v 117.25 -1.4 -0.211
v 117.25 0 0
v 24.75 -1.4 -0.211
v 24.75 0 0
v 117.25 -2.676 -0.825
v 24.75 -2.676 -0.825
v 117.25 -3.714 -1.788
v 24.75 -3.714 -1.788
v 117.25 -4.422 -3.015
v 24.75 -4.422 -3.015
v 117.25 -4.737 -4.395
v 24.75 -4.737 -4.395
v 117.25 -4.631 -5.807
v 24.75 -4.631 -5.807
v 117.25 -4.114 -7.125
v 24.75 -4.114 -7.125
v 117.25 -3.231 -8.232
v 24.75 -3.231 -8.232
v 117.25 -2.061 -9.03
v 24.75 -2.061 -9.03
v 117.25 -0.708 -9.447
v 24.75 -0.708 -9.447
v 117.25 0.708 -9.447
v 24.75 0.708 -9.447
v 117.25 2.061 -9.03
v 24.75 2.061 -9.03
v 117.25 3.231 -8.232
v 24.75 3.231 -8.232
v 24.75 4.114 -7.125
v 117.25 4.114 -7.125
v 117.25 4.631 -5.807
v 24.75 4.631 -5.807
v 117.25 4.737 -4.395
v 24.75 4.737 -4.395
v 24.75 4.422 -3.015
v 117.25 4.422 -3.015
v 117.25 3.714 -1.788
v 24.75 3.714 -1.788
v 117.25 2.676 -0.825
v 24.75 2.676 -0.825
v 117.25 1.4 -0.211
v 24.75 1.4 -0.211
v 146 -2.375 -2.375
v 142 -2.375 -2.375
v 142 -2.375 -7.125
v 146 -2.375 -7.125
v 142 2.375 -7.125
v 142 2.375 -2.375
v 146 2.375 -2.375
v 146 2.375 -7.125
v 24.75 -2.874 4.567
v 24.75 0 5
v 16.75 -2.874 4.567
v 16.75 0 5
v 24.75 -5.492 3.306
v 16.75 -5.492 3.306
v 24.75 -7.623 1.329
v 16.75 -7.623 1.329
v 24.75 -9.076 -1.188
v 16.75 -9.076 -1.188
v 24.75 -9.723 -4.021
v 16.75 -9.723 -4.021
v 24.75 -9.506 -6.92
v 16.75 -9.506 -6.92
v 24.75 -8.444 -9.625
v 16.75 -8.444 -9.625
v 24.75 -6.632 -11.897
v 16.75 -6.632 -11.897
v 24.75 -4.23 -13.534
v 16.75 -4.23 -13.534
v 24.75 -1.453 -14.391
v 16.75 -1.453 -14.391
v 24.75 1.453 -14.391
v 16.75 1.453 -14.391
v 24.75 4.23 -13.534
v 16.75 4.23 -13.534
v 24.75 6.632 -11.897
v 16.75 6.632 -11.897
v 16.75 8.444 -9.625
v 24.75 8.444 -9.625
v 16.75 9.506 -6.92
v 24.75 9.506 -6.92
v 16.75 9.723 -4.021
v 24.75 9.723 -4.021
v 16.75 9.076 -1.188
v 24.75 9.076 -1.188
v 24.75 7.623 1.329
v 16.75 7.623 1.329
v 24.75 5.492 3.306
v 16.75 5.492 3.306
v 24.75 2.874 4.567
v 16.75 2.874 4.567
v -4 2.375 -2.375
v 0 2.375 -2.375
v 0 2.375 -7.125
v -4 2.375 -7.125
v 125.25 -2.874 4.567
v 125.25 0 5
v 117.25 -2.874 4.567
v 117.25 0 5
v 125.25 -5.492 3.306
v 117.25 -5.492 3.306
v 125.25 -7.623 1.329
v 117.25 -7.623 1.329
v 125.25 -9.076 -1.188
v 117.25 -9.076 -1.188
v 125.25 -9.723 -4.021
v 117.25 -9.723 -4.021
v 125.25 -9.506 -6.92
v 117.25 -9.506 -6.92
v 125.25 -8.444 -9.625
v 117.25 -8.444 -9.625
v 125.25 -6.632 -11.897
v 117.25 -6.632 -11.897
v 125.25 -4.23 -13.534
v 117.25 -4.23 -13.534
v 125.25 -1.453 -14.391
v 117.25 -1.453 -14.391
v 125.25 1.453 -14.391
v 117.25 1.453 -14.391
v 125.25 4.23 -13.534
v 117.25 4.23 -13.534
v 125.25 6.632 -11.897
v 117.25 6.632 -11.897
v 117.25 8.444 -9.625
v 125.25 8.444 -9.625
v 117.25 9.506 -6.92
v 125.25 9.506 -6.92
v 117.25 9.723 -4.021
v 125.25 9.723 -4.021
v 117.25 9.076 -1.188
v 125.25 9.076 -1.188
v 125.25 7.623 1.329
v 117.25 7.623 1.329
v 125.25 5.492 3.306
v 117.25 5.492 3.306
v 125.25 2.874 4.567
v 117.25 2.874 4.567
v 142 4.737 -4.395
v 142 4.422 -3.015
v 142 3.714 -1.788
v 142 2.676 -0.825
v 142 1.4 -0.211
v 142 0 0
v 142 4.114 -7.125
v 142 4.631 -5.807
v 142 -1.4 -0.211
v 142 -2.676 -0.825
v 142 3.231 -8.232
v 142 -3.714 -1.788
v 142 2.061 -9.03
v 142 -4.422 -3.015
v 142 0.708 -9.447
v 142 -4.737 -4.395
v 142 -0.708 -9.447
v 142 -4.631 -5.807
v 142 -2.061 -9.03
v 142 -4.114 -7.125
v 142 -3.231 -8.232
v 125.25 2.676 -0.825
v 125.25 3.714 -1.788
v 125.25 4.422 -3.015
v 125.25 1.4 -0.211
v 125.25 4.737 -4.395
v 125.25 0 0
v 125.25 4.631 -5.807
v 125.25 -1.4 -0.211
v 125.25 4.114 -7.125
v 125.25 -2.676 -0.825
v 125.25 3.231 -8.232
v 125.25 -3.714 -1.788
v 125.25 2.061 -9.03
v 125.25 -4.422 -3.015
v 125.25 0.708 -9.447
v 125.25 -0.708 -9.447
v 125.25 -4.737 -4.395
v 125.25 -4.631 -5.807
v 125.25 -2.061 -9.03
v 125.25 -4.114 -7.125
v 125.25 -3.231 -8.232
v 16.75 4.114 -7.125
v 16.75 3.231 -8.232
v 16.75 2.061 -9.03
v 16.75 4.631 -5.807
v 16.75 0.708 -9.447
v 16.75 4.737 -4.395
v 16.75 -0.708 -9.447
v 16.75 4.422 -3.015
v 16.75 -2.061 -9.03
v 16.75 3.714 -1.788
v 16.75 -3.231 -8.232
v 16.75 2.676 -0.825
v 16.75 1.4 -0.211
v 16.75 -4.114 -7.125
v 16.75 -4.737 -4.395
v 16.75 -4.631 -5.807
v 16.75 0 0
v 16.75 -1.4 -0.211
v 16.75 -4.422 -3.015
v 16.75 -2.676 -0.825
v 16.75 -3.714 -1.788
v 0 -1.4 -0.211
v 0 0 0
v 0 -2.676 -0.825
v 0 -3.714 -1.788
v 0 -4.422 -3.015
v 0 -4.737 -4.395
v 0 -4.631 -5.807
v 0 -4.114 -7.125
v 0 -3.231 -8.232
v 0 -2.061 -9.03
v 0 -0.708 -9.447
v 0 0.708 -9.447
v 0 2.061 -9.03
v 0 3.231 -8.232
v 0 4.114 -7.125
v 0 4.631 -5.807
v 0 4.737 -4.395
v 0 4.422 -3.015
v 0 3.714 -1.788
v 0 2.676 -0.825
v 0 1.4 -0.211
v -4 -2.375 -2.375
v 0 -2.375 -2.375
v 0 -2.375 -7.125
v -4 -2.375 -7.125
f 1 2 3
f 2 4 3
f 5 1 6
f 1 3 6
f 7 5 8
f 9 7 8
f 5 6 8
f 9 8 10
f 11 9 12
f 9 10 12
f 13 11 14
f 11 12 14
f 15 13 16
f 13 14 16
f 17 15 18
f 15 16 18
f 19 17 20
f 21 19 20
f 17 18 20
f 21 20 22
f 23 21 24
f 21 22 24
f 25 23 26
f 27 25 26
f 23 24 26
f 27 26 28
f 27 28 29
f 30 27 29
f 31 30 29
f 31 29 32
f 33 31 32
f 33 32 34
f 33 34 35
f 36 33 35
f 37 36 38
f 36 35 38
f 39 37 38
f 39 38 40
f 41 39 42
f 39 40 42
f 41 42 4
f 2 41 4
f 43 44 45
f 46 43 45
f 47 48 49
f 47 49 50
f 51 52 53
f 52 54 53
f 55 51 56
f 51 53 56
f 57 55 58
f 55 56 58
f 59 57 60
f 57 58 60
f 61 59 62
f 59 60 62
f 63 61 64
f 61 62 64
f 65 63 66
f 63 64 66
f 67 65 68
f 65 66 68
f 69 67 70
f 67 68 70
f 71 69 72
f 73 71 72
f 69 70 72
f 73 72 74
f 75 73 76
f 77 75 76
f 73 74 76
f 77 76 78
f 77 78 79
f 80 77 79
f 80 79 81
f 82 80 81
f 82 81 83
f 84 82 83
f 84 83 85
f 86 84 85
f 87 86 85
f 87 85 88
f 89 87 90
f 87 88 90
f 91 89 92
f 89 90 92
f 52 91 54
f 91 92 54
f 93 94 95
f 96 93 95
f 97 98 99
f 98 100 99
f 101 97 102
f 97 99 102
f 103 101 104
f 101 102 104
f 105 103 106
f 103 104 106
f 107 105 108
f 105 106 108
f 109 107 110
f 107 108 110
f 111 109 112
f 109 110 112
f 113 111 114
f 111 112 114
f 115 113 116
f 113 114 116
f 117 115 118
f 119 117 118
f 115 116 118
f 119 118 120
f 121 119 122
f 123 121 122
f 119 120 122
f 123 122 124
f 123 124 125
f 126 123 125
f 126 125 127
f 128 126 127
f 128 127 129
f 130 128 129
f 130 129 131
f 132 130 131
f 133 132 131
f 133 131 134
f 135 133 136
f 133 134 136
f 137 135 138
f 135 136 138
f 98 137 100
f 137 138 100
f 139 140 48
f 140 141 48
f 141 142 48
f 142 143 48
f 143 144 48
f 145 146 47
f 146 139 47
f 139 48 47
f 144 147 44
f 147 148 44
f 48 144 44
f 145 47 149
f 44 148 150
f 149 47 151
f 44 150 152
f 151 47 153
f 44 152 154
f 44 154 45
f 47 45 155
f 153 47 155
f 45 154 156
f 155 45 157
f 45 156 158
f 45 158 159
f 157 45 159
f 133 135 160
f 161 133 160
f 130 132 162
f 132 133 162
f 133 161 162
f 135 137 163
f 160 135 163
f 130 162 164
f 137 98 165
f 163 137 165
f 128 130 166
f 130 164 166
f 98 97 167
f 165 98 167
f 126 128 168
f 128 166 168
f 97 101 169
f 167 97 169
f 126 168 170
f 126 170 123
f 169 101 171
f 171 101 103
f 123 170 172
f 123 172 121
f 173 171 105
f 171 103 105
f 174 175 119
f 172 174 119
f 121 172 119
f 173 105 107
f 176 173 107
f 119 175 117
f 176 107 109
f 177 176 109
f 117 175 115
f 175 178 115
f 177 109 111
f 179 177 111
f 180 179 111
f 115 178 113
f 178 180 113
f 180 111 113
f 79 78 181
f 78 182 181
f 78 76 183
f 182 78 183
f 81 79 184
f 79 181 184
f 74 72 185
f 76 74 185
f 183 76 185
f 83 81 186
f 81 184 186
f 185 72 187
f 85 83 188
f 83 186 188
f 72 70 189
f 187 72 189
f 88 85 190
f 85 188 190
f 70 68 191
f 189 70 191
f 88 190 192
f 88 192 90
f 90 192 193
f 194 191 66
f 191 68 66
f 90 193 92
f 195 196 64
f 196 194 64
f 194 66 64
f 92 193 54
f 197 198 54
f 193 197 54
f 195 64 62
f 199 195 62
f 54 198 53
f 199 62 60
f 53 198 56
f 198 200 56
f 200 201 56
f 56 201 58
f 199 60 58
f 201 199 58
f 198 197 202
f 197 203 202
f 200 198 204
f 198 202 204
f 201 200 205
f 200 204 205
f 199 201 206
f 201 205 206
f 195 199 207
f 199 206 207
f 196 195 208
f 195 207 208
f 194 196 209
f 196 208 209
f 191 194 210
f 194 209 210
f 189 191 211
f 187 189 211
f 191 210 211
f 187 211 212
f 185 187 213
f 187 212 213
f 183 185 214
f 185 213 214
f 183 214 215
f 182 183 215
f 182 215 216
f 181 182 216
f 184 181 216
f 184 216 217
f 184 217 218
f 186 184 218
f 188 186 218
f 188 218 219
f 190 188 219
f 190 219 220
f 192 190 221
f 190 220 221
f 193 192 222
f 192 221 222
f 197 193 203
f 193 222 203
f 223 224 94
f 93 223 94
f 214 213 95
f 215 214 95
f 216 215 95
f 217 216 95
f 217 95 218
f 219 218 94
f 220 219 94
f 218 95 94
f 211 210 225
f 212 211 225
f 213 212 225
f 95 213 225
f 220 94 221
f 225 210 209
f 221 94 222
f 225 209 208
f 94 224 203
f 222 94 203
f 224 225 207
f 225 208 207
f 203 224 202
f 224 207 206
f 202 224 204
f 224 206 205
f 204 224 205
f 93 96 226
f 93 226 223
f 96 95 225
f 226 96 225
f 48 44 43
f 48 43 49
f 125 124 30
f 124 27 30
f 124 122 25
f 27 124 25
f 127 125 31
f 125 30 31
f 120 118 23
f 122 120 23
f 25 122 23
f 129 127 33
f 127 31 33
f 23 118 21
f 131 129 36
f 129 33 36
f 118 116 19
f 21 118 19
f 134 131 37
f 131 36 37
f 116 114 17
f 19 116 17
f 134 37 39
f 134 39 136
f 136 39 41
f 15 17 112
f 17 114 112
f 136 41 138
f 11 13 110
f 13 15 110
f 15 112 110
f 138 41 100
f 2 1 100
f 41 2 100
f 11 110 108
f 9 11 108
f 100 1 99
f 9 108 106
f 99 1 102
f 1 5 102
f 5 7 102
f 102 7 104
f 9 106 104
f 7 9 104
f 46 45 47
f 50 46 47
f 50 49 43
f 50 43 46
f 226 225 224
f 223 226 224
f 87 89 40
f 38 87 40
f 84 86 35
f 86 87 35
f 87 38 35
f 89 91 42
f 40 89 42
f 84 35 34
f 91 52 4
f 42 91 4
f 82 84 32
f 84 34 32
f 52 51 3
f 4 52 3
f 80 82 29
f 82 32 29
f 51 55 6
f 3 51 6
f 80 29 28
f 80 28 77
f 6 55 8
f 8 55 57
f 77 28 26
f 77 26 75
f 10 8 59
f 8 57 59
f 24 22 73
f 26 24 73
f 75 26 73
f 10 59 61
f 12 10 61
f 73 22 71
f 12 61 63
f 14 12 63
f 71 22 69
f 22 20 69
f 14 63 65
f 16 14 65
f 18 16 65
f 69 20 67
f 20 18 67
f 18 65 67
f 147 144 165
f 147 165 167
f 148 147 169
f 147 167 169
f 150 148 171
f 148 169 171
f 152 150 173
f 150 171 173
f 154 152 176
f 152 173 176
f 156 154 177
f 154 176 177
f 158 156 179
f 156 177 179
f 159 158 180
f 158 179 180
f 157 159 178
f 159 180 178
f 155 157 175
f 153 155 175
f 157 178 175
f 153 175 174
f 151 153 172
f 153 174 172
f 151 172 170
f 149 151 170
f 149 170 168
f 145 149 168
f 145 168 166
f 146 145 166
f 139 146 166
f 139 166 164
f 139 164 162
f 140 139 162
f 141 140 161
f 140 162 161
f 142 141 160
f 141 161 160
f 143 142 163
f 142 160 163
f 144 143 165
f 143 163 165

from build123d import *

# Parameters (mm, degrees)
ESQUISSE5_W        = 4.75
ESQUISSE5_H        = 4.75
BOSS_EXTRU_3_DEPTH = 4
BOSS_EXTRU_4_DEPTH = 4


with BuildPart() as part:
    # Esquisse1 → Révolution1 (revolve)
    with BuildSketch(Plane(origin=(0, 0, 0), x_dir=(1, 0, 0), z_dir=(0, 1, 0))):
        Polygon((0, 0), (0, 4.75), (142, 4.75), (142, 0), (125.25, 0), (125.25, -5), (117.25, -5), (117.25, 0), (24.75, 0), (24.75, -5), (16.75, -5), (16.75, 0), align=None)
    revolve(axis=Axis((0, 0, -4.75), (1, 0, 0)))

    # Esquisse5 → Boss.-Extru.3 (add)
    with BuildSketch(Plane(origin=(142, 0, 0), x_dir=(0, 0, -1), z_dir=(1, 0, 0))):
        with Locations((4.75, 0)):
            Rectangle(ESQUISSE5_W, ESQUISSE5_H)
    extrude(amount=BOSS_EXTRU_3_DEPTH)

    # Esquisse6 → Boss.-Extru.4 (add)
    with BuildSketch(Plane.ZY):
        Polygon((-4.75, 2.375), (-7.125, 2.375), (-7.125, -2.375), (-2.375, -2.375), (-2.375, 2.375), align=None)
    extrude(amount=BOSS_EXTRU_4_DEPTH)


solid = part.part
